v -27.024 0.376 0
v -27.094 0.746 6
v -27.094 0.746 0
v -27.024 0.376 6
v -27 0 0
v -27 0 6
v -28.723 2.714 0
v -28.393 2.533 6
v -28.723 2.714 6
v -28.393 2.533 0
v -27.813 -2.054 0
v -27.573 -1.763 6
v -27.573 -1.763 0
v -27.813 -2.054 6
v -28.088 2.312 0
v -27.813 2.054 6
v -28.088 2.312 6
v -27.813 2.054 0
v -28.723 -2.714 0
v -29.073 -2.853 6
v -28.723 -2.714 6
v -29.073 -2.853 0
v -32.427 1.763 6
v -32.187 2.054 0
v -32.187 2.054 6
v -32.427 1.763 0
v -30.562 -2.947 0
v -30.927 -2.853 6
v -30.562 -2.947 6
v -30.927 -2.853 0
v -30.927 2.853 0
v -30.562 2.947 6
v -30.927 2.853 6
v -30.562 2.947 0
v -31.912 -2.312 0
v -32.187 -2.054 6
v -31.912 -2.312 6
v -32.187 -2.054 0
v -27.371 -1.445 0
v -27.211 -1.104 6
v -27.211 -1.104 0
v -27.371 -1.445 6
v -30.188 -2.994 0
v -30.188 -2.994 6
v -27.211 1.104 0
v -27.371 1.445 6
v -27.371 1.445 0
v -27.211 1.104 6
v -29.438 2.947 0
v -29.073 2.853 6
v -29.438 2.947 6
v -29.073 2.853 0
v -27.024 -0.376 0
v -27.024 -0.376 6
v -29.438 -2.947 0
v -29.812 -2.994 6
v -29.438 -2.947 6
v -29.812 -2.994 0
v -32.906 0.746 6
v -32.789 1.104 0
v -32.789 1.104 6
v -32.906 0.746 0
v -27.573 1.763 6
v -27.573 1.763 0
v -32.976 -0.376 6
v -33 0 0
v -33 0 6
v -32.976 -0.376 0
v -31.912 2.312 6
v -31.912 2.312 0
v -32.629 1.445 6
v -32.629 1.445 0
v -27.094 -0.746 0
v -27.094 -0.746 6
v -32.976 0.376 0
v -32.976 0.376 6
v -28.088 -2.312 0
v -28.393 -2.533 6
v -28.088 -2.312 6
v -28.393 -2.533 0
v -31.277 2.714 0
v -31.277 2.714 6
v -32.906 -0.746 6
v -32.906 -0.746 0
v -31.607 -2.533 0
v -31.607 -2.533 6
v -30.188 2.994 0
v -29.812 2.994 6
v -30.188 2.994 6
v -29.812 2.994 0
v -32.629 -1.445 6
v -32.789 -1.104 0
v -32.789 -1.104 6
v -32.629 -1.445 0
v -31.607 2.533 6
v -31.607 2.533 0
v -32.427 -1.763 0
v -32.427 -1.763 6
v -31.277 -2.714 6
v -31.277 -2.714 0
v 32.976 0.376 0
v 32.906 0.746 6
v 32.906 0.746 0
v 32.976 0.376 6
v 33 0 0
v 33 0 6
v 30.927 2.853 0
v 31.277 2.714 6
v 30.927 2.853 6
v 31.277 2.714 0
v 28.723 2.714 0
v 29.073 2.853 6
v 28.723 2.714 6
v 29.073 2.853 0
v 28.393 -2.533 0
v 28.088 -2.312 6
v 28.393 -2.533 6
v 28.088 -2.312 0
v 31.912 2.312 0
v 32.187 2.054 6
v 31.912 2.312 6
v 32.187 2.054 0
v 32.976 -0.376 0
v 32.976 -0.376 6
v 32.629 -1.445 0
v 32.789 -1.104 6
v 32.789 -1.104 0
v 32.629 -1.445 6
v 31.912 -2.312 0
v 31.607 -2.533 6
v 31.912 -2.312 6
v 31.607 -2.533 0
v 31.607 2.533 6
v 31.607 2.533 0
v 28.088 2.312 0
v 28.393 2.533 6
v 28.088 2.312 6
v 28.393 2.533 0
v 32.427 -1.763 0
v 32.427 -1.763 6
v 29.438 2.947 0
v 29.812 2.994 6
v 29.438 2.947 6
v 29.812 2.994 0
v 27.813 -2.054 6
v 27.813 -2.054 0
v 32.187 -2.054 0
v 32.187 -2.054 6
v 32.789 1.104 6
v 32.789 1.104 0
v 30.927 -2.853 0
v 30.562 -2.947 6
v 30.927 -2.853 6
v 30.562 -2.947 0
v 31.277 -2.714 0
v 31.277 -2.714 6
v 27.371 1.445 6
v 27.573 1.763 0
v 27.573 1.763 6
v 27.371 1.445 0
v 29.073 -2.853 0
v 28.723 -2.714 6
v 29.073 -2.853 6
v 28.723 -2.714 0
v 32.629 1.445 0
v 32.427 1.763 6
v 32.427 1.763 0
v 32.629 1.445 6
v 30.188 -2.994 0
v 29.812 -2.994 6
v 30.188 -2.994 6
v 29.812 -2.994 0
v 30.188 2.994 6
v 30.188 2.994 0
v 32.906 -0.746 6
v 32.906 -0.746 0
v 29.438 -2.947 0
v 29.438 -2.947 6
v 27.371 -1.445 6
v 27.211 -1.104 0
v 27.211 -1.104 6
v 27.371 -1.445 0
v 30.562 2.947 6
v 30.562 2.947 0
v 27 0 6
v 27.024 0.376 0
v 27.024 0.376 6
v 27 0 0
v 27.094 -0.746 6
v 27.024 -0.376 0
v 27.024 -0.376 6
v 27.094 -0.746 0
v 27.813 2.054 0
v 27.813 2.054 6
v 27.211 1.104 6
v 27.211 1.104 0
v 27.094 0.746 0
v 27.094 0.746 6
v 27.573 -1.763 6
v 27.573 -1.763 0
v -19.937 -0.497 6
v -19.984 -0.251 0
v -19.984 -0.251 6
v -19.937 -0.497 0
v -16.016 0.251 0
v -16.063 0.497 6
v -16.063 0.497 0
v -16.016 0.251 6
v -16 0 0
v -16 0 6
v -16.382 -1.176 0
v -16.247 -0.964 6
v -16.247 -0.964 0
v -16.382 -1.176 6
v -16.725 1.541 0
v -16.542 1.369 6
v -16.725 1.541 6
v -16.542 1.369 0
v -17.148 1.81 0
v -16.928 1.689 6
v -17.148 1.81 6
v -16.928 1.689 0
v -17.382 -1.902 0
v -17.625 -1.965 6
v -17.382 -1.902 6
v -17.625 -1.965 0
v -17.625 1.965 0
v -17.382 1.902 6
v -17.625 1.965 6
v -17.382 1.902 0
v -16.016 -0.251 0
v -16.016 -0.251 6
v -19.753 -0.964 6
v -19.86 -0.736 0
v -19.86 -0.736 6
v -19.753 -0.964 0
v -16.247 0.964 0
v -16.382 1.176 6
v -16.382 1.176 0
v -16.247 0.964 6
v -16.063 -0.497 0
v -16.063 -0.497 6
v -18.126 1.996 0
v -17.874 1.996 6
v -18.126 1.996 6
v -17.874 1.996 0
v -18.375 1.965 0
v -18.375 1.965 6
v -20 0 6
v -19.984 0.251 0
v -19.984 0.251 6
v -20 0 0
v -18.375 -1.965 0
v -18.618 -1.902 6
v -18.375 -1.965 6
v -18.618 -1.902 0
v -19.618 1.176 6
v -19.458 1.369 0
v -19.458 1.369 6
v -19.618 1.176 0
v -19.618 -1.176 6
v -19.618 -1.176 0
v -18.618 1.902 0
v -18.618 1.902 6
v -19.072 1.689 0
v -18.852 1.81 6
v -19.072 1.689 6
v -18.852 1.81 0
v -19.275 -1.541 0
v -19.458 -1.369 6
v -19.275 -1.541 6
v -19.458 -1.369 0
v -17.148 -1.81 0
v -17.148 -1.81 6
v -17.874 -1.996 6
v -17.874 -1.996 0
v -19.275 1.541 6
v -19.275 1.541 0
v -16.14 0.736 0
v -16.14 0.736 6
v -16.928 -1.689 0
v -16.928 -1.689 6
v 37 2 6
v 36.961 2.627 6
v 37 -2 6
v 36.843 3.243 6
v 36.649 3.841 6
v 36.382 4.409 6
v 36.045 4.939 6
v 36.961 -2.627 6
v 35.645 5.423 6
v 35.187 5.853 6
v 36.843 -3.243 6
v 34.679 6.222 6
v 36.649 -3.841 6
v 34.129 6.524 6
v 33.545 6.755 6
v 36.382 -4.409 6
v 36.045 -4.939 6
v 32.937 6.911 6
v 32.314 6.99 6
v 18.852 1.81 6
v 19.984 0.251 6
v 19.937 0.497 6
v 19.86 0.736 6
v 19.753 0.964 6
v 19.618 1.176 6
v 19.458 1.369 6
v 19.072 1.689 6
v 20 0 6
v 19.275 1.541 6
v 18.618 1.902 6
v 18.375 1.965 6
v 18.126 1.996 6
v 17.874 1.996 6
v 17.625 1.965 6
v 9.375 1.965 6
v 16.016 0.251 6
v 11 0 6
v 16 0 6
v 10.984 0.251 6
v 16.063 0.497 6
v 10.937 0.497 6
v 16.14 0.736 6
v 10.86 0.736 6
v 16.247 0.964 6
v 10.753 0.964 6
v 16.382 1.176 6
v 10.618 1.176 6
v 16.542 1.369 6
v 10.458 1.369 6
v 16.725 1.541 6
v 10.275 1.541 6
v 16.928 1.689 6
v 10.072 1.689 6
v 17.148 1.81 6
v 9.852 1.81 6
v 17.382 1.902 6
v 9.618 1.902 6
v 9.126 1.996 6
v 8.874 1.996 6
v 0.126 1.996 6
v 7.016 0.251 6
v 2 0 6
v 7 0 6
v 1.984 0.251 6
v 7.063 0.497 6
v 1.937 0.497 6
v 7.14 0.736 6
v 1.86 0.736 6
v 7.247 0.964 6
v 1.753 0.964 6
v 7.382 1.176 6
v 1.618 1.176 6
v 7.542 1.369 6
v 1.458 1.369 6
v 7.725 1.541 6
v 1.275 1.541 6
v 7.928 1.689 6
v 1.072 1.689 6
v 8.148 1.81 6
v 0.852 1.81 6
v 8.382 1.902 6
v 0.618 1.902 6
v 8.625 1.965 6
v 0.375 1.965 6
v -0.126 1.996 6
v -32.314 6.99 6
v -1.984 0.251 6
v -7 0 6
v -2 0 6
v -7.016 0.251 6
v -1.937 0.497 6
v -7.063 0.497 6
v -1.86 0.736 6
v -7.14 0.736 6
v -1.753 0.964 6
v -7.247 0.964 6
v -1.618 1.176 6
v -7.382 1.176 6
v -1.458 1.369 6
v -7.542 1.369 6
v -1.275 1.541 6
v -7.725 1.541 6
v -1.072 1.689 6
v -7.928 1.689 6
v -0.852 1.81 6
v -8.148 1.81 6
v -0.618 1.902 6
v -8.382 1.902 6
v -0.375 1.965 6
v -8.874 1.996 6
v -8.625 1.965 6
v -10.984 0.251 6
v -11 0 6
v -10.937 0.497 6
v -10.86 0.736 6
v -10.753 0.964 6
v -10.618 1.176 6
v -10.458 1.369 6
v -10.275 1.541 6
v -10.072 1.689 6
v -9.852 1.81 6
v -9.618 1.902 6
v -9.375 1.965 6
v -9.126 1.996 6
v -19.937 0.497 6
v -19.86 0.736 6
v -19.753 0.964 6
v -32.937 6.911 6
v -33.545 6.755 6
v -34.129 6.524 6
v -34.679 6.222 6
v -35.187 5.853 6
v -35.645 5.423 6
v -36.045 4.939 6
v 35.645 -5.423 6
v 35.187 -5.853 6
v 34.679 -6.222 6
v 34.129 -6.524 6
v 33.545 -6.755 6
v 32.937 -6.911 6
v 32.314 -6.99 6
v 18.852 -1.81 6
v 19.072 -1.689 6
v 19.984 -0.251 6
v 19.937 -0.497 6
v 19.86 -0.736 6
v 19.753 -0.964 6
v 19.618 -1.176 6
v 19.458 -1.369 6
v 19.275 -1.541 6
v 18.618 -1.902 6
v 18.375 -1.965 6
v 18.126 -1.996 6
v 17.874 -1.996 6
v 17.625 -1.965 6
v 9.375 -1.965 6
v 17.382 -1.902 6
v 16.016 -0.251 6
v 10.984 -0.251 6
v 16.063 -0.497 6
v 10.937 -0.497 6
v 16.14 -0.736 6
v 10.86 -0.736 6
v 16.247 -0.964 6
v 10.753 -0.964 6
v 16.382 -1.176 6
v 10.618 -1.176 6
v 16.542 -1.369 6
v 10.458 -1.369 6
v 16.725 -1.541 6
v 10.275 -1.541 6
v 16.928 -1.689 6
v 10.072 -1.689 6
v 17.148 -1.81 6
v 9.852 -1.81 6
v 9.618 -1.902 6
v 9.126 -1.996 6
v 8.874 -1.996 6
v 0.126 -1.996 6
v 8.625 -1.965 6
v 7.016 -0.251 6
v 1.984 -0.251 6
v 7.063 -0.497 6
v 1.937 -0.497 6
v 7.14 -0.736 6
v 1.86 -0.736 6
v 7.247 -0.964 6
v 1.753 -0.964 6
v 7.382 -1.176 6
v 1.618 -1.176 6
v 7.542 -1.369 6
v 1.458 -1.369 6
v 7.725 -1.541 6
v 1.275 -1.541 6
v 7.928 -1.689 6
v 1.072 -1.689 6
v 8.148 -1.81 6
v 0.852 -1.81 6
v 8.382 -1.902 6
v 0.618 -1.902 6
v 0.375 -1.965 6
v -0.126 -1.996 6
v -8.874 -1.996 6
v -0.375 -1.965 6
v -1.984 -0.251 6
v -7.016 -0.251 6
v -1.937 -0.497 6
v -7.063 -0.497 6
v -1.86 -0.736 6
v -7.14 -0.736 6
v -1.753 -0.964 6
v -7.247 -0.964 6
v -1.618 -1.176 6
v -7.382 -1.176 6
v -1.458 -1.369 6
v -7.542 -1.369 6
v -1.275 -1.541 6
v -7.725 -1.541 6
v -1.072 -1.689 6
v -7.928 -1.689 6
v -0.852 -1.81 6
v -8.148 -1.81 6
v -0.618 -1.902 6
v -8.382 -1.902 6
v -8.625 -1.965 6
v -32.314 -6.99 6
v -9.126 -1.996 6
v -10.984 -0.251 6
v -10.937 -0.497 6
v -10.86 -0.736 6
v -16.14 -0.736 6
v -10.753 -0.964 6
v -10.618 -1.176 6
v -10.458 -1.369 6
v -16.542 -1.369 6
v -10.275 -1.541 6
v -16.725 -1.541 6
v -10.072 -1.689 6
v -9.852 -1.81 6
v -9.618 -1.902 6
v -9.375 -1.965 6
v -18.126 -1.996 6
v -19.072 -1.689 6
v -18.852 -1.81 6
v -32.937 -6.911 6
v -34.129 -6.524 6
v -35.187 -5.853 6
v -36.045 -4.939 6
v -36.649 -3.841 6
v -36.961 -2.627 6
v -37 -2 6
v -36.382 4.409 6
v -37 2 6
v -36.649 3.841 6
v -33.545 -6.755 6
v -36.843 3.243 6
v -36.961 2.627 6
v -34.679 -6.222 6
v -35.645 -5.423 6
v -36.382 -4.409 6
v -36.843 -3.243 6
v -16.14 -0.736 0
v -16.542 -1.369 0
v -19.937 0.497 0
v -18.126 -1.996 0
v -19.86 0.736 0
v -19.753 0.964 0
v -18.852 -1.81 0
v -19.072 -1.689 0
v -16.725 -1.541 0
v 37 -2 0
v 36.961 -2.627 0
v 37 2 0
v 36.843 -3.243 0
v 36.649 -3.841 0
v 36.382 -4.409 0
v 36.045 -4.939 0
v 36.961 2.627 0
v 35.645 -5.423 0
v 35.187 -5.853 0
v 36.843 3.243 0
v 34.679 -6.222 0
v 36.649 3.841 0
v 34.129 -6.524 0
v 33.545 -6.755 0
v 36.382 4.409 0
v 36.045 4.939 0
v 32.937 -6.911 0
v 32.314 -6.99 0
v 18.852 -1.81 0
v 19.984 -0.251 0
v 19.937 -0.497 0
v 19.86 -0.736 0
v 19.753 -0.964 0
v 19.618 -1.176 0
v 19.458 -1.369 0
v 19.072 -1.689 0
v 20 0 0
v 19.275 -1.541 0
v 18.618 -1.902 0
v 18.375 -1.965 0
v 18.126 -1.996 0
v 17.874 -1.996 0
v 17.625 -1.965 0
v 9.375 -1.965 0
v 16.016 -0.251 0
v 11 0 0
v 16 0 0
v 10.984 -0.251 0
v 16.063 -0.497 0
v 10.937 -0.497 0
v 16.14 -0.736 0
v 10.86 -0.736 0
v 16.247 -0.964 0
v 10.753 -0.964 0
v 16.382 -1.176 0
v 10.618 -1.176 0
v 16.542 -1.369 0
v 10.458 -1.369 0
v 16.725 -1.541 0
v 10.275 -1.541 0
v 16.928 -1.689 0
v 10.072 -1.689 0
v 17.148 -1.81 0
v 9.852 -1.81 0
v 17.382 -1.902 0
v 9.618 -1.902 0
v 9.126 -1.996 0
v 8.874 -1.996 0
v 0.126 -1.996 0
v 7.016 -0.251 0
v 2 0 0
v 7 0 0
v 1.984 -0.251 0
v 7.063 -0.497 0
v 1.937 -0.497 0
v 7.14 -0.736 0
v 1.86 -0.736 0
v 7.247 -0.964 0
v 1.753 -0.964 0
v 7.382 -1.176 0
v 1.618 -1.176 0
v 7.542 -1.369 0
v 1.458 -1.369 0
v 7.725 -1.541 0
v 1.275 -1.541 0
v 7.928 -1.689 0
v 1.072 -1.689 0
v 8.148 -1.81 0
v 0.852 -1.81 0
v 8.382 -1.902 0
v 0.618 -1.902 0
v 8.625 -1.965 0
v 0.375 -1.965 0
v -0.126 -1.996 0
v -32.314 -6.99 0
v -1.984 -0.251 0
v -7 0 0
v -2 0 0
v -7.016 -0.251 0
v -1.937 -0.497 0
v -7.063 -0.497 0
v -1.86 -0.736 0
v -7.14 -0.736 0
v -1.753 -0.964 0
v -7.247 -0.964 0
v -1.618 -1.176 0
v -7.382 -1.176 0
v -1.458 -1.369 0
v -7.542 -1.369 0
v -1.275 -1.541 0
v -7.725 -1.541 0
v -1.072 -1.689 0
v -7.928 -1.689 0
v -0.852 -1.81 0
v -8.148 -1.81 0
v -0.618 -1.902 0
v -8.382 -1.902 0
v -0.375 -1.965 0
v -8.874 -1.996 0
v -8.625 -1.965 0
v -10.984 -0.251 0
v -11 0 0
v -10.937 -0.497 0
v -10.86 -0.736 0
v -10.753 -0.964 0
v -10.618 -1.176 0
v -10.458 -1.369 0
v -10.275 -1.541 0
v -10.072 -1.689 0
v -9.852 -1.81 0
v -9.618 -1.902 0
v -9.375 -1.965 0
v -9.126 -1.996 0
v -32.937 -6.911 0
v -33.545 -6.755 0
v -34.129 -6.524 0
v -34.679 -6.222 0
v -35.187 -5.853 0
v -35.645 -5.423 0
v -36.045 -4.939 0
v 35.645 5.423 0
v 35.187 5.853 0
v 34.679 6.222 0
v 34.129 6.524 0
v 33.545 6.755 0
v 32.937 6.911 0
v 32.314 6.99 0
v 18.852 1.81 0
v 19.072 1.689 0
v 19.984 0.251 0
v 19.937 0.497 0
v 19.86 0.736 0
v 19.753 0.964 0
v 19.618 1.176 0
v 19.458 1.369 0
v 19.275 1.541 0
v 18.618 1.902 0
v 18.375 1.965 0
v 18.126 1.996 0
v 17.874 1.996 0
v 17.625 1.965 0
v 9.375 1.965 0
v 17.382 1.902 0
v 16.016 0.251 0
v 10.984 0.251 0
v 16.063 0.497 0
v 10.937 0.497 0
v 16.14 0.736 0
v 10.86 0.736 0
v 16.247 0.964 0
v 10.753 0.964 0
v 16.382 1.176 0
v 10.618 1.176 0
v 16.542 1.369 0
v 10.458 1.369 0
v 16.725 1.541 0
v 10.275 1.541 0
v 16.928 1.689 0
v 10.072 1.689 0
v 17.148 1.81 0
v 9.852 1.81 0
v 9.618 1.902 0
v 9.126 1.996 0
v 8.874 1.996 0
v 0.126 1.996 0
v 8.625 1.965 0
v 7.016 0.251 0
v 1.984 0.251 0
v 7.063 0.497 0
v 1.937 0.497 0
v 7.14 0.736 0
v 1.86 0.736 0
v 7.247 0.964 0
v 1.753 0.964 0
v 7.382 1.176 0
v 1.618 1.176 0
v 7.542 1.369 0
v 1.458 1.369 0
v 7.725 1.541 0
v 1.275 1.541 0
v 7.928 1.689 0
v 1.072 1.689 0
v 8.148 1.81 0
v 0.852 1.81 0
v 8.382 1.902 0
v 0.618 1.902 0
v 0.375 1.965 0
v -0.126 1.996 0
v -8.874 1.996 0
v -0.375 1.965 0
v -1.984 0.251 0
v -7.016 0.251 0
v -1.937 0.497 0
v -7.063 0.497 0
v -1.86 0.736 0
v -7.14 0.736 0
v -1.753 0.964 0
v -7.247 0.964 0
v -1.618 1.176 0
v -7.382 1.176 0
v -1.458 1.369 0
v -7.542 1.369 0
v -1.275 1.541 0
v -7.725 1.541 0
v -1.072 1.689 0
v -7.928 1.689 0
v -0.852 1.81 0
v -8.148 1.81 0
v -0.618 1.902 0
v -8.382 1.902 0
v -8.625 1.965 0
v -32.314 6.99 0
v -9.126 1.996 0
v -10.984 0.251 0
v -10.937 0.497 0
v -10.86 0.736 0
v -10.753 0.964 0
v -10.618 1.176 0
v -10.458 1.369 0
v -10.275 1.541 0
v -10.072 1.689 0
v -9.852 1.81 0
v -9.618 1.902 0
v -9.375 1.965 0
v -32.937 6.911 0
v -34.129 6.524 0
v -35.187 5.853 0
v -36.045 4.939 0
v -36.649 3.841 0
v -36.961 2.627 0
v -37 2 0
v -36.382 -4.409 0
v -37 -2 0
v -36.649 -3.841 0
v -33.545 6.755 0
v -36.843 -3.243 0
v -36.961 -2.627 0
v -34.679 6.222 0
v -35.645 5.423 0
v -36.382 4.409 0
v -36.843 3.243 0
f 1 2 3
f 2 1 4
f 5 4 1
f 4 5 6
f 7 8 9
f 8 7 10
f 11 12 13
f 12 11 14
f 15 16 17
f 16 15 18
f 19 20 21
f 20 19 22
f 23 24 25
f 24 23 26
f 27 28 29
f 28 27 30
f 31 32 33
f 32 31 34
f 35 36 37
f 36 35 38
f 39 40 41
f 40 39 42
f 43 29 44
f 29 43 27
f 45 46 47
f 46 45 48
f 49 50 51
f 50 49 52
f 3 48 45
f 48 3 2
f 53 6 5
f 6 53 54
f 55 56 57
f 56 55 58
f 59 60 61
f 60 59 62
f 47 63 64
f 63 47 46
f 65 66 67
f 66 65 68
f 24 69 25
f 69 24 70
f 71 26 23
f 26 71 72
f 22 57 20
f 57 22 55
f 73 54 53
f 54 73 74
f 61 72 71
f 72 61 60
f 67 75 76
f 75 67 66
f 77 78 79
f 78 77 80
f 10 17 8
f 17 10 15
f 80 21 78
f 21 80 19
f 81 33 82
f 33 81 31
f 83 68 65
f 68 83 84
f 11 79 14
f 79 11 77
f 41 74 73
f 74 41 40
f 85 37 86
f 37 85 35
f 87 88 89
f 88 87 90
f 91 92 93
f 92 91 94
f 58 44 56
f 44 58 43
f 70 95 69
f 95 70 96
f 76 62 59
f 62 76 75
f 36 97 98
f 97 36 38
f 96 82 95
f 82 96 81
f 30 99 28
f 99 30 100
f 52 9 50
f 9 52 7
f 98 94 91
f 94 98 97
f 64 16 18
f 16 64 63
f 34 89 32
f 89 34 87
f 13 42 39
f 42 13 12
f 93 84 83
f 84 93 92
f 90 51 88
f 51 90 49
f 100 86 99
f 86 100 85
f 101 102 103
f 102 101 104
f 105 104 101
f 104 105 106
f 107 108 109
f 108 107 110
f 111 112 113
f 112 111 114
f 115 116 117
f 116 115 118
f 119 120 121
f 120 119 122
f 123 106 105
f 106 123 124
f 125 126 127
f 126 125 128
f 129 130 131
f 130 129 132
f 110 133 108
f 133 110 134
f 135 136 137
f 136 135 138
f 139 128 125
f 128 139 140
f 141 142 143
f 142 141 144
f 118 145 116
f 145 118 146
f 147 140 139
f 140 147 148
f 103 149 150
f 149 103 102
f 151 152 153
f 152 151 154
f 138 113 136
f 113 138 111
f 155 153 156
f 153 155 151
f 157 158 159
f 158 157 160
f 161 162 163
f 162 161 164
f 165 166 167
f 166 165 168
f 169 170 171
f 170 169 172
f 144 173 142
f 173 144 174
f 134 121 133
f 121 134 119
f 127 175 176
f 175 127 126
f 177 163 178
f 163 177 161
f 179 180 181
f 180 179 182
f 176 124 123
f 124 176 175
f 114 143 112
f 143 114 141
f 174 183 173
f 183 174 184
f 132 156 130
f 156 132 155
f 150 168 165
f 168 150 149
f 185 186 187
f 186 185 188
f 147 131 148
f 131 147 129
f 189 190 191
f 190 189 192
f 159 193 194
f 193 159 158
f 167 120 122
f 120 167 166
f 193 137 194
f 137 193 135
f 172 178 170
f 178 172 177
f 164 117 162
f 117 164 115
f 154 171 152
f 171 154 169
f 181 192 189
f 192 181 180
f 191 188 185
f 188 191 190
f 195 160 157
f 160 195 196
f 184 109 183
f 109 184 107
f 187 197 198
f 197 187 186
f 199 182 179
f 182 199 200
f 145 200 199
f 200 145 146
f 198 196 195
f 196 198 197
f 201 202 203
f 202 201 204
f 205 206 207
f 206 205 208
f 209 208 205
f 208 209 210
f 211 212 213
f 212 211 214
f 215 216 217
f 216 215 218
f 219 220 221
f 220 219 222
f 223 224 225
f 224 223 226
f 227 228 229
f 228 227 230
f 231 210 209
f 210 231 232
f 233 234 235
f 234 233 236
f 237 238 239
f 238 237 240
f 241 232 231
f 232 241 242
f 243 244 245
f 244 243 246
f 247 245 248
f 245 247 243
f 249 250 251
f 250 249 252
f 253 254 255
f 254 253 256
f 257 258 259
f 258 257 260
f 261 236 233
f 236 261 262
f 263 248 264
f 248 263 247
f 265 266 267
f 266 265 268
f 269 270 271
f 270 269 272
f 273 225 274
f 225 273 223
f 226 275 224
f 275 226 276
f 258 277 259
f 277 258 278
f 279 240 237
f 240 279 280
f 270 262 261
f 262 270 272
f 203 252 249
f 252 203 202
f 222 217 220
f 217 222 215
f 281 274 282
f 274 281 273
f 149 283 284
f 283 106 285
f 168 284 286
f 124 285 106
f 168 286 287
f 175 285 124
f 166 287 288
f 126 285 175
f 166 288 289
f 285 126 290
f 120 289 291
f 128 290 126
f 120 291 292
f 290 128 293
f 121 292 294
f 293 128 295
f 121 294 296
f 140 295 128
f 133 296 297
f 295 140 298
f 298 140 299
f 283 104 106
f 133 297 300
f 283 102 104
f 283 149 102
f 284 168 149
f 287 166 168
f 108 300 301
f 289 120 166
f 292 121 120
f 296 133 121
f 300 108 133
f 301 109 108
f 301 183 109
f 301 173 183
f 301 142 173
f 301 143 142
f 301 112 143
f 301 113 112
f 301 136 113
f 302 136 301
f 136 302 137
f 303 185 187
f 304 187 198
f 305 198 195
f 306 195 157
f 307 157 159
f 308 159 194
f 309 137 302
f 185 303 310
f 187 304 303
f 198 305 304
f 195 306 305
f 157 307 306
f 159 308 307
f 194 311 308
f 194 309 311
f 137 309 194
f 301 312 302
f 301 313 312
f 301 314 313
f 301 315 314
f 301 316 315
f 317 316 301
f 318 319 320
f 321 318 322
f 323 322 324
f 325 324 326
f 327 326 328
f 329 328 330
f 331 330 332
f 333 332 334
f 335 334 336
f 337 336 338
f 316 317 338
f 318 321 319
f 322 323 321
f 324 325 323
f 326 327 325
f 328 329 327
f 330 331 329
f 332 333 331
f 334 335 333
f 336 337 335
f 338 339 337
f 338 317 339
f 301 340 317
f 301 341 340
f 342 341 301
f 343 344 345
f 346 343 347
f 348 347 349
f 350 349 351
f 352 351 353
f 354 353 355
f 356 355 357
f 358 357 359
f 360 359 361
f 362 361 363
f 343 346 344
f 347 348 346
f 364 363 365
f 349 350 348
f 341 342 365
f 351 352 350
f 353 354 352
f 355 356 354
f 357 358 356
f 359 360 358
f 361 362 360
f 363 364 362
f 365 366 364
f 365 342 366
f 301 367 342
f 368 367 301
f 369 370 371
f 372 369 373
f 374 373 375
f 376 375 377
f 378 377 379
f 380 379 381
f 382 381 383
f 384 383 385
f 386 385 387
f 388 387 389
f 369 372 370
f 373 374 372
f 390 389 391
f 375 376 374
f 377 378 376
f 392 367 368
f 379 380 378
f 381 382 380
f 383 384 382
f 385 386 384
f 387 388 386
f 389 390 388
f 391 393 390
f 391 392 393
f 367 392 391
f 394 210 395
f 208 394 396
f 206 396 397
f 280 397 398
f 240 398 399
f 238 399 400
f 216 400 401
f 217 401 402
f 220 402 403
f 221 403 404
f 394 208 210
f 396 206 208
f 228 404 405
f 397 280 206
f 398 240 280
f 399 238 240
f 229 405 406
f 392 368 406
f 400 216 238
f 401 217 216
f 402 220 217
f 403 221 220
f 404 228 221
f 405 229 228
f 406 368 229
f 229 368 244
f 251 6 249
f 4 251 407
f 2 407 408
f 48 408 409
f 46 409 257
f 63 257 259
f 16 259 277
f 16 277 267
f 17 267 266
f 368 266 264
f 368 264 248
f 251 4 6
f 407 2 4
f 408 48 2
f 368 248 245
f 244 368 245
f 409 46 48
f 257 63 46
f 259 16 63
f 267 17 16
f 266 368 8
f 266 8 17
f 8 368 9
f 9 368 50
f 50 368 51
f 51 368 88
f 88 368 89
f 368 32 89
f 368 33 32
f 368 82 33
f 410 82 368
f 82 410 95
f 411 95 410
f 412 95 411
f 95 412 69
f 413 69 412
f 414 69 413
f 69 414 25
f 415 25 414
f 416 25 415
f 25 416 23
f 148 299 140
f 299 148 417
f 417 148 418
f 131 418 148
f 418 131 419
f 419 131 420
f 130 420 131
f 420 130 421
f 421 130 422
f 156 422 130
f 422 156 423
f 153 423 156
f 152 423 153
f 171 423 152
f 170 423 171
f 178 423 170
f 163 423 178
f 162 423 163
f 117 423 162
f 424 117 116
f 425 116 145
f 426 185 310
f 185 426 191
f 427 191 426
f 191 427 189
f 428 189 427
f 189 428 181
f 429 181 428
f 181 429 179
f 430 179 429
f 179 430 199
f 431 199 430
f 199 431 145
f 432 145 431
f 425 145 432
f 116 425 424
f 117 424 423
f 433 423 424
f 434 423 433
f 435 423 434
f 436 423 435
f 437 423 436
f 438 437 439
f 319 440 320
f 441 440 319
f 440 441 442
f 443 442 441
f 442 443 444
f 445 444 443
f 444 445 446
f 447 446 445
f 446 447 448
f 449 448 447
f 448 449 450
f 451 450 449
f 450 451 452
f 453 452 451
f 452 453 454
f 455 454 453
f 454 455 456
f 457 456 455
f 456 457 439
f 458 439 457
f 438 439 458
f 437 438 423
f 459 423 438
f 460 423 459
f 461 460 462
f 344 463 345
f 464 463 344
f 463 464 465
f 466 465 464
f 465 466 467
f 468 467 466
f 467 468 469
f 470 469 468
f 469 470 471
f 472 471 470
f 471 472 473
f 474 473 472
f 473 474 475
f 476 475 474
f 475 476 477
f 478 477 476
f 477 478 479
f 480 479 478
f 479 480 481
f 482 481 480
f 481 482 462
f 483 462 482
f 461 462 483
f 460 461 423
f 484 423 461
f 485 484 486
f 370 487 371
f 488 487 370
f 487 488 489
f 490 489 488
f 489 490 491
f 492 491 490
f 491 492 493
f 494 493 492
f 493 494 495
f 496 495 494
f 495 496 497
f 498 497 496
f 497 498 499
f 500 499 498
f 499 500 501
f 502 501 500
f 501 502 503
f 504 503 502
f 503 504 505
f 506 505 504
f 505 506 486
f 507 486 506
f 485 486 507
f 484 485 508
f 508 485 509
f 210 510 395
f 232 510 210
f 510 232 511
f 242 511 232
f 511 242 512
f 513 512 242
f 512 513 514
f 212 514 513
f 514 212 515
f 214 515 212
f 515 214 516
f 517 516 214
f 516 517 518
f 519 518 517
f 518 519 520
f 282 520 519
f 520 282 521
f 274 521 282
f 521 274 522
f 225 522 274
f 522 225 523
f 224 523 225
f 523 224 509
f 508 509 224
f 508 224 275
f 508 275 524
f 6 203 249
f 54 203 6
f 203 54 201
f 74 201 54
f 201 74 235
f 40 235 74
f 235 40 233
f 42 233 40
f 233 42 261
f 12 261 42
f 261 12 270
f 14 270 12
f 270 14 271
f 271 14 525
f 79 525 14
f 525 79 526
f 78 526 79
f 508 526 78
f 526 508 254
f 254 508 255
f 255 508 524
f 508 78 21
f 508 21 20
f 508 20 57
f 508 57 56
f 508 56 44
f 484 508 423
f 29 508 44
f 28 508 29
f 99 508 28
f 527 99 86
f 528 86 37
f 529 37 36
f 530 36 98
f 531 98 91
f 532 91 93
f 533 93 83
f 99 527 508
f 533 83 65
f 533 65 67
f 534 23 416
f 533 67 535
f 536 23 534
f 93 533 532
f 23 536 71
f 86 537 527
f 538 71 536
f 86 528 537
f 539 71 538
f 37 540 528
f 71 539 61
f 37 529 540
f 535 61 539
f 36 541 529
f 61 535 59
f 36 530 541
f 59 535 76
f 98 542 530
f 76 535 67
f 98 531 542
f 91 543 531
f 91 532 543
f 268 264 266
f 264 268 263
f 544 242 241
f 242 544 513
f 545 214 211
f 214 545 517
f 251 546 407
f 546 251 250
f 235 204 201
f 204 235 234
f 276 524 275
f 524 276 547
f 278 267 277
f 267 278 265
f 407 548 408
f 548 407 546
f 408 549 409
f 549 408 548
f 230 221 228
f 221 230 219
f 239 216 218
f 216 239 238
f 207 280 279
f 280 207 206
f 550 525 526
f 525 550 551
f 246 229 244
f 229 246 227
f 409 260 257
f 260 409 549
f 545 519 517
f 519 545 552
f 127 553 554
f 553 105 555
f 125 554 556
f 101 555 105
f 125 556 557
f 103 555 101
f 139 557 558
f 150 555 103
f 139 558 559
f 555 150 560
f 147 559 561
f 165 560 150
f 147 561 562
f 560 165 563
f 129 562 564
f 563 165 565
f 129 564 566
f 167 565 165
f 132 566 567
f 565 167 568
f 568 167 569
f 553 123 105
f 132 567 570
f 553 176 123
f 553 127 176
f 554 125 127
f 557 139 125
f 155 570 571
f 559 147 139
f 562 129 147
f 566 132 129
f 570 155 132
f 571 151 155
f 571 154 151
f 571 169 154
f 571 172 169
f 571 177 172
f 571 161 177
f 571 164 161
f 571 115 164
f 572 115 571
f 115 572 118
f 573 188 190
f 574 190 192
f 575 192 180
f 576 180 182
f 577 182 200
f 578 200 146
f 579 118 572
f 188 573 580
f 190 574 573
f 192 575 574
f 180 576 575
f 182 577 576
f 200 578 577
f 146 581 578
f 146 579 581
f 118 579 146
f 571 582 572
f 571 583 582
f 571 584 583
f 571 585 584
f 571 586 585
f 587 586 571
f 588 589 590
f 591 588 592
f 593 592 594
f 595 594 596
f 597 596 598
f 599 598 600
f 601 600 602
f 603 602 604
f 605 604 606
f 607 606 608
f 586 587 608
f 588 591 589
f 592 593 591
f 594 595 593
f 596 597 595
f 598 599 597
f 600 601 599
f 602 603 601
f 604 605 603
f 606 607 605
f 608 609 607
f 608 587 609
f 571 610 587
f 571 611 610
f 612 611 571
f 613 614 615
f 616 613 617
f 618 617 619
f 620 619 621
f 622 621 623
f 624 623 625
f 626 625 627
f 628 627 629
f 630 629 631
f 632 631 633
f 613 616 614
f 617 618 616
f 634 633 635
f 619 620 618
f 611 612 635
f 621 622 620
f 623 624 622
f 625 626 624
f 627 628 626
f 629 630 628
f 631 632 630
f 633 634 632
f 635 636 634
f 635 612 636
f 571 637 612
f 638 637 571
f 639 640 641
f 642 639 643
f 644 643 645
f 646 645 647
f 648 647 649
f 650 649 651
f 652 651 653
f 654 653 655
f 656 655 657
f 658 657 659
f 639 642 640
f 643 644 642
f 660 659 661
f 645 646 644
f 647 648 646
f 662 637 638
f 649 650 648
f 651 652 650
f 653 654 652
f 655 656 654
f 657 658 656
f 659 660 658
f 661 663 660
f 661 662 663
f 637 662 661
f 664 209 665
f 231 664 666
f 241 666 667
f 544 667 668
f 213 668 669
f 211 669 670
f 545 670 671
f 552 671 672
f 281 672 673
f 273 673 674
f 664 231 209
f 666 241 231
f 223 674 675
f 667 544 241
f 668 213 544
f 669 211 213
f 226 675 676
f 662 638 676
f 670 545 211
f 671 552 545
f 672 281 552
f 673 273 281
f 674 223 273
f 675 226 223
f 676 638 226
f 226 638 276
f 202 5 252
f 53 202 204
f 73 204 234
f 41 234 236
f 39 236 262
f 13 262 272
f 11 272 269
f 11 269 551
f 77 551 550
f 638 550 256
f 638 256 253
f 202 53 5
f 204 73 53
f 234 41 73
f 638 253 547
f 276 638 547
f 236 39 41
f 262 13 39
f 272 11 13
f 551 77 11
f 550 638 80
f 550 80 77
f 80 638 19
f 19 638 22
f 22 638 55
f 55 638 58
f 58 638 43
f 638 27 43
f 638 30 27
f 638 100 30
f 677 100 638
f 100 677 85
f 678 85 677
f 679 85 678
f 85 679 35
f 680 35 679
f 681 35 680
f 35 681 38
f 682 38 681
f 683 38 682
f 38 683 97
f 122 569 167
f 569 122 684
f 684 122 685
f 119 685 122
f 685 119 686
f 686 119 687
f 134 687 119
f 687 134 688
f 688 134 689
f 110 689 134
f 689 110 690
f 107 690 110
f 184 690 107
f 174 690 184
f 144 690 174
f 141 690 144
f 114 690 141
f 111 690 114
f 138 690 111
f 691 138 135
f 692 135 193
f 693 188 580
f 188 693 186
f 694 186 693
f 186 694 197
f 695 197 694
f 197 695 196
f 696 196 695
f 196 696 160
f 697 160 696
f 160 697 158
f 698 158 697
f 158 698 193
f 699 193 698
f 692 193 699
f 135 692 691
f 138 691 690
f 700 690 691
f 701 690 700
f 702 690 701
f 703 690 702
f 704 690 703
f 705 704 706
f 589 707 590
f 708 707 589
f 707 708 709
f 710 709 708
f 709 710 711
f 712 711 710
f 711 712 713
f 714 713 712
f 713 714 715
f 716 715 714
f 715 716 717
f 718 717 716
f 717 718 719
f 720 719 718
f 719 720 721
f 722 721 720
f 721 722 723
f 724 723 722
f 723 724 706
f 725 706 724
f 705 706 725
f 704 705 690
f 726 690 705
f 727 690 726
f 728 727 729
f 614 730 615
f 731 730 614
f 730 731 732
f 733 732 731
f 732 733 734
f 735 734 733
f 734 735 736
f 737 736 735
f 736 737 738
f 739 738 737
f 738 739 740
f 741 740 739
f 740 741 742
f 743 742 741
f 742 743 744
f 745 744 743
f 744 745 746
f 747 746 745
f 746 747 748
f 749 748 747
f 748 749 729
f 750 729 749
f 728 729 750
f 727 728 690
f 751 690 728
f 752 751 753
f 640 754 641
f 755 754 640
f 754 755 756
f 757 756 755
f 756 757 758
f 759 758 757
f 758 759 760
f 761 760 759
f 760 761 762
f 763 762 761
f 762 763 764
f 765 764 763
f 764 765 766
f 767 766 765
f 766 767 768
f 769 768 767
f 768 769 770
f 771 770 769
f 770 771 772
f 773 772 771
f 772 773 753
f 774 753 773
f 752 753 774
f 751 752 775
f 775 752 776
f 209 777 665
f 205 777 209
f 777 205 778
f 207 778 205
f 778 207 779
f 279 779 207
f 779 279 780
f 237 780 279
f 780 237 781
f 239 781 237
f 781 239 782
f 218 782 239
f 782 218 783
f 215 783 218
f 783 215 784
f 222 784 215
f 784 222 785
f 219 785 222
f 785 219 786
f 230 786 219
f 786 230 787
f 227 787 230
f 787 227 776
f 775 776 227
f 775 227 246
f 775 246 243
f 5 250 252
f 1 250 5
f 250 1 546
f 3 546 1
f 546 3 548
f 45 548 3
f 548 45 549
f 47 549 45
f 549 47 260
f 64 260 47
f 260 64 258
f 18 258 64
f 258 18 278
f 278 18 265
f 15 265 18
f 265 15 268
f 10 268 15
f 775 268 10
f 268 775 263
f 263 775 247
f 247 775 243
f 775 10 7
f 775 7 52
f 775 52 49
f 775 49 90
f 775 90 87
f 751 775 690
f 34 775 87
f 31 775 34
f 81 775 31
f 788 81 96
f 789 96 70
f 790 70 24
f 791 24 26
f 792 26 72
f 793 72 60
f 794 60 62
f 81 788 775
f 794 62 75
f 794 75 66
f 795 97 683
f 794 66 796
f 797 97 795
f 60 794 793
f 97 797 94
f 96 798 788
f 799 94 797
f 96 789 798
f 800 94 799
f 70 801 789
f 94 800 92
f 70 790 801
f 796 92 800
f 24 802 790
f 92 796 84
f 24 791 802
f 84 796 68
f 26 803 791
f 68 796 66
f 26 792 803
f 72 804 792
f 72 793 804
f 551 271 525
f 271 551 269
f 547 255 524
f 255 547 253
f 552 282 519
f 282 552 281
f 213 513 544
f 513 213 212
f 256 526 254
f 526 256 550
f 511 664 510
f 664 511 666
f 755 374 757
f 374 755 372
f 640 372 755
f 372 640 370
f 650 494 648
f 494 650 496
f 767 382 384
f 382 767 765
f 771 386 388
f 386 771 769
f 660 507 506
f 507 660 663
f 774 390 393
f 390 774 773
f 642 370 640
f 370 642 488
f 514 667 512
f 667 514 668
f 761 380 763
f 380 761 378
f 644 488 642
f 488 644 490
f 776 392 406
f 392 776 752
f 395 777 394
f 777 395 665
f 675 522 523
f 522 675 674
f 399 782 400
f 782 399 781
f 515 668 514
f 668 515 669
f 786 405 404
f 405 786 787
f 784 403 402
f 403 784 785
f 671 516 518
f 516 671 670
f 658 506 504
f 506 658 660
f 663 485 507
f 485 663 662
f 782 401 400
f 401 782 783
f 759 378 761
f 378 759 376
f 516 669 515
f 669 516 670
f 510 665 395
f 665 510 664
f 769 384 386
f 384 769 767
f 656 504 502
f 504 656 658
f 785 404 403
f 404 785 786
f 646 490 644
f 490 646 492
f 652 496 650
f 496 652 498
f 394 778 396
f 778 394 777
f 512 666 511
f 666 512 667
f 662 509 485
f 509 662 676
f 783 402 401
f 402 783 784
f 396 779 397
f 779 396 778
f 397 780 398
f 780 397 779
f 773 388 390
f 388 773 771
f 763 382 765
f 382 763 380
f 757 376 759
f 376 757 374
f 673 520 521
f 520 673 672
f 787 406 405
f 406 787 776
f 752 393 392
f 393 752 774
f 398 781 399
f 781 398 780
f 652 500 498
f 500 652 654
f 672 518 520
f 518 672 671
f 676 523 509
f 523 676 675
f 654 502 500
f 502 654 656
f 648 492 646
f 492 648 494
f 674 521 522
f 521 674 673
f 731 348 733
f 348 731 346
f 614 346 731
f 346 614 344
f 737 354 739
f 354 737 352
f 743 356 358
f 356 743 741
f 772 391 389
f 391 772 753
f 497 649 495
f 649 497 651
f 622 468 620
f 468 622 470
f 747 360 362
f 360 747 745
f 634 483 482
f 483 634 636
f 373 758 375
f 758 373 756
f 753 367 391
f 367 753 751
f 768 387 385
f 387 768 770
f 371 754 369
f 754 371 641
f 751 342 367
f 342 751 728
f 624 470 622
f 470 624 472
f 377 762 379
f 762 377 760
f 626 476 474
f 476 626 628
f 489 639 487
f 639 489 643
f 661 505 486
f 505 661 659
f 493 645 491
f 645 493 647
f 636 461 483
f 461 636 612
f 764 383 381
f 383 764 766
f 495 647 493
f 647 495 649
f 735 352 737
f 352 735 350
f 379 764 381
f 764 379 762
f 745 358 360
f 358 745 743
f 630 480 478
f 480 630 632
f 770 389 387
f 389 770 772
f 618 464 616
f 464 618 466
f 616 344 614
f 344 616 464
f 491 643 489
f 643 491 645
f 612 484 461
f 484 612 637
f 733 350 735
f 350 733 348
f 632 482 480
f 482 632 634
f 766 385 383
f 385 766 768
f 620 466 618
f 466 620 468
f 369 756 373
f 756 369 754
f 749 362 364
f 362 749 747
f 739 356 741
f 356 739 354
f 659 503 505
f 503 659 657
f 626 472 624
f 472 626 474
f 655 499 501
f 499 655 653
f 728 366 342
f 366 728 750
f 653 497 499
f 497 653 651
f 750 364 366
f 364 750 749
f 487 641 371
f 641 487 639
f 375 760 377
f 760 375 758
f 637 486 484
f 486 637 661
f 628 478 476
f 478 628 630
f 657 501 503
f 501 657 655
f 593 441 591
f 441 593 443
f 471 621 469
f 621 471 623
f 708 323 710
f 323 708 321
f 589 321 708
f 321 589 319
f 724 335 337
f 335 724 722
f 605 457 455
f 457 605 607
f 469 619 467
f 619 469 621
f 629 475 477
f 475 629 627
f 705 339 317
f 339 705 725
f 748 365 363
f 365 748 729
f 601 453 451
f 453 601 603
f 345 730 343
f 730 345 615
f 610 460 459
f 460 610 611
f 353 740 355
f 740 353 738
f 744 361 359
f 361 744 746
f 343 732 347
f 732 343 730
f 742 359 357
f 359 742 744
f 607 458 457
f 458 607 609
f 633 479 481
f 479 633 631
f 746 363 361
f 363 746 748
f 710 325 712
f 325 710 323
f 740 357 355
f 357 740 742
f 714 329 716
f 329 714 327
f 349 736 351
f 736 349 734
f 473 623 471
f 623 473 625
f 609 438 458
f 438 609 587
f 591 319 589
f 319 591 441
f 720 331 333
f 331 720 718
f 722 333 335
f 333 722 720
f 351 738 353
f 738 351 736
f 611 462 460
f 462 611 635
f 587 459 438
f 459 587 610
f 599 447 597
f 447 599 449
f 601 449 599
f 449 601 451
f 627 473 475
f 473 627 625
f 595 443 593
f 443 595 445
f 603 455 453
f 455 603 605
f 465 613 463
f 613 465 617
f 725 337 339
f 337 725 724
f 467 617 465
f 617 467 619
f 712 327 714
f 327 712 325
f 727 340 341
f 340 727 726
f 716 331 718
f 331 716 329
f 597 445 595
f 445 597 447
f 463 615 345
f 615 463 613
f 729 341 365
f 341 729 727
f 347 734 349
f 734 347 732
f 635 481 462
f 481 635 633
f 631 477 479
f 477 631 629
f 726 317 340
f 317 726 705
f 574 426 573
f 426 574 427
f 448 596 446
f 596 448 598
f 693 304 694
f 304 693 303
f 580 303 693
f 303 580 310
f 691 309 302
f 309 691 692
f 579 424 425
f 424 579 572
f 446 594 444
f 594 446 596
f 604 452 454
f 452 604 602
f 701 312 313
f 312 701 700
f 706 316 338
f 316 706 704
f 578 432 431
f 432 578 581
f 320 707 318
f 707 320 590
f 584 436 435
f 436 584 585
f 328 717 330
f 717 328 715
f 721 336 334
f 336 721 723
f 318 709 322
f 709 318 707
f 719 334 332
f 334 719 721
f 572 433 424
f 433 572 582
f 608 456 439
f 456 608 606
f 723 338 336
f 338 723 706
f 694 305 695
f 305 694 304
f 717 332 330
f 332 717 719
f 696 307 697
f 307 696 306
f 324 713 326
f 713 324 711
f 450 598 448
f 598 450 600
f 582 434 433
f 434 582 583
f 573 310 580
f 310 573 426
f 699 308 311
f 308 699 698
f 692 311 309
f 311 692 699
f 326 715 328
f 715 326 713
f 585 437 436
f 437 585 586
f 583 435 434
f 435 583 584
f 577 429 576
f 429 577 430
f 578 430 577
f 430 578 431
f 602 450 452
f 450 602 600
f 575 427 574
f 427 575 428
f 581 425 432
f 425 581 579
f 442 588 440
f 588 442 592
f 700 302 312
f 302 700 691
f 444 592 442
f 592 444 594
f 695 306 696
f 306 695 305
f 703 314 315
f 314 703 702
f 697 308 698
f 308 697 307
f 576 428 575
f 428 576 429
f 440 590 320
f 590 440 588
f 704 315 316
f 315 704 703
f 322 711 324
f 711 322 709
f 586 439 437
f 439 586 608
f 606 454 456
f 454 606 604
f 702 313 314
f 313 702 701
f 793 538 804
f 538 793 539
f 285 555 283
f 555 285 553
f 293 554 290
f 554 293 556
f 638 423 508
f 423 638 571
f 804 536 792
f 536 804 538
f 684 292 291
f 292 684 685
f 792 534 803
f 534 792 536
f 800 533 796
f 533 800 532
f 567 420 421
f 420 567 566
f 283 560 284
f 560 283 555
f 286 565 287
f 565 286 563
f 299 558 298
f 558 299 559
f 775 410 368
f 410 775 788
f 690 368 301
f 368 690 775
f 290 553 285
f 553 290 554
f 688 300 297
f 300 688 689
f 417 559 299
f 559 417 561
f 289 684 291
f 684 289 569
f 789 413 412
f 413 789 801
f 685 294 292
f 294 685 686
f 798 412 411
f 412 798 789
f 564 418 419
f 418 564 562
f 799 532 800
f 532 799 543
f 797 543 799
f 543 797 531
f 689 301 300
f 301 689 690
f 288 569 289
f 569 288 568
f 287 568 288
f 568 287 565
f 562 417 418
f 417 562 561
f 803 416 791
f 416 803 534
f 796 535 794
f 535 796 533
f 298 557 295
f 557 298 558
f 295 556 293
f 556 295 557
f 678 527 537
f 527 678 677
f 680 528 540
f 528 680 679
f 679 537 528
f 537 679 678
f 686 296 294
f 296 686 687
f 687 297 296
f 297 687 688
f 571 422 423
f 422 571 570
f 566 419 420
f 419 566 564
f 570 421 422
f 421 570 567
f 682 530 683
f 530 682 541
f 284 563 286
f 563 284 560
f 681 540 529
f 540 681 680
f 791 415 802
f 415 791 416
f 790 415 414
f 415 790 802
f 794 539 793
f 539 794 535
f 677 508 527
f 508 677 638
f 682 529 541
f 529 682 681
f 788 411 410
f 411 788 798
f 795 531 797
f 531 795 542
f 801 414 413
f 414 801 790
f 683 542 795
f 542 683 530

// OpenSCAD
$fn = 50;


difference() {
	union() {
		hull() {
			translate(v = [-32.0000000000, 2.0000000000, 0]) {
				cylinder(h = 6, r = 5);
			}
			translate(v = [32.0000000000, 2.0000000000, 0]) {
				cylinder(h = 6, r = 5);
			}
			translate(v = [-32.0000000000, -2.0000000000, 0]) {
				cylinder(h = 6, r = 5);
			}
			translate(v = [32.0000000000, -2.0000000000, 0]) {
				cylinder(h = 6, r = 5);
			}
		}
	}
	union() {
		#translate(v = [-30.0000000000, 0.0000000000, 0]) {
			cylinder(h = 6, r = 3.0000000000);
		}
		#translate(v = [30.0000000000, 0.0000000000, 0]) {
			cylinder(h = 6, r = 3.0000000000);
		}
		#translate(v = [-30.0000000000, 0.0000000000, -100.0000000000]) {
			cylinder(h = 200, r = 3.0000000000);
		}
		#translate(v = [-30.0000000000, 0.0000000000, -100.0000000000]) {
			cylinder(h = 200, r = 3.0000000000);
		}
		#translate(v = [30.0000000000, 0.0000000000, -100.0000000000]) {
			cylinder(h = 200, r = 3.0000000000);
		}
		#translate(v = [30.0000000000, 0.0000000000, -100.0000000000]) {
			cylinder(h = 200, r = 3.0000000000);
		}
		#translate(v = [-30.0000000000, 0.0000000000, 0]) {
			cylinder(h = 6, r = 1.5000000000);
		}
		#translate(v = [30.0000000000, 0.0000000000, 0]) {
			cylinder(h = 6, r = 1.5000000000);
		}
		#translate(v = [-30.0000000000, 0.0000000000, 0]) {
			cylinder(h = 6, r = 1.5000000000);
		}
		#translate(v = [30.0000000000, 0.0000000000, 0]) {
			cylinder(h = 6, r = 1.5000000000);
		}
		#translate(v = [-30.0000000000, 0.0000000000, 0]) {
			cylinder(h = 6, r = 1.5000000000);
		}
		#translate(v = [30.0000000000, 0.0000000000, 0]) {
			cylinder(h = 6, r = 1.5000000000);
		}
		#translate(v = [-18.0000000000, 0, 0]) {
			cylinder(h = 6, r = 2.0000000000);
		}
		#translate(v = [-9.0000000000, 0, 0]) {
			cylinder(h = 6, r = 2.0000000000);
		}
		#cylinder(h = 6, r = 2.0000000000);
		#translate(v = [9.0000000000, 0, 0]) {
			cylinder(h = 6, r = 2.0000000000);
		}
		#translate(v = [18.0000000000, 0, 0]) {
			cylinder(h = 6, r = 2.0000000000);
		}
	}
}
